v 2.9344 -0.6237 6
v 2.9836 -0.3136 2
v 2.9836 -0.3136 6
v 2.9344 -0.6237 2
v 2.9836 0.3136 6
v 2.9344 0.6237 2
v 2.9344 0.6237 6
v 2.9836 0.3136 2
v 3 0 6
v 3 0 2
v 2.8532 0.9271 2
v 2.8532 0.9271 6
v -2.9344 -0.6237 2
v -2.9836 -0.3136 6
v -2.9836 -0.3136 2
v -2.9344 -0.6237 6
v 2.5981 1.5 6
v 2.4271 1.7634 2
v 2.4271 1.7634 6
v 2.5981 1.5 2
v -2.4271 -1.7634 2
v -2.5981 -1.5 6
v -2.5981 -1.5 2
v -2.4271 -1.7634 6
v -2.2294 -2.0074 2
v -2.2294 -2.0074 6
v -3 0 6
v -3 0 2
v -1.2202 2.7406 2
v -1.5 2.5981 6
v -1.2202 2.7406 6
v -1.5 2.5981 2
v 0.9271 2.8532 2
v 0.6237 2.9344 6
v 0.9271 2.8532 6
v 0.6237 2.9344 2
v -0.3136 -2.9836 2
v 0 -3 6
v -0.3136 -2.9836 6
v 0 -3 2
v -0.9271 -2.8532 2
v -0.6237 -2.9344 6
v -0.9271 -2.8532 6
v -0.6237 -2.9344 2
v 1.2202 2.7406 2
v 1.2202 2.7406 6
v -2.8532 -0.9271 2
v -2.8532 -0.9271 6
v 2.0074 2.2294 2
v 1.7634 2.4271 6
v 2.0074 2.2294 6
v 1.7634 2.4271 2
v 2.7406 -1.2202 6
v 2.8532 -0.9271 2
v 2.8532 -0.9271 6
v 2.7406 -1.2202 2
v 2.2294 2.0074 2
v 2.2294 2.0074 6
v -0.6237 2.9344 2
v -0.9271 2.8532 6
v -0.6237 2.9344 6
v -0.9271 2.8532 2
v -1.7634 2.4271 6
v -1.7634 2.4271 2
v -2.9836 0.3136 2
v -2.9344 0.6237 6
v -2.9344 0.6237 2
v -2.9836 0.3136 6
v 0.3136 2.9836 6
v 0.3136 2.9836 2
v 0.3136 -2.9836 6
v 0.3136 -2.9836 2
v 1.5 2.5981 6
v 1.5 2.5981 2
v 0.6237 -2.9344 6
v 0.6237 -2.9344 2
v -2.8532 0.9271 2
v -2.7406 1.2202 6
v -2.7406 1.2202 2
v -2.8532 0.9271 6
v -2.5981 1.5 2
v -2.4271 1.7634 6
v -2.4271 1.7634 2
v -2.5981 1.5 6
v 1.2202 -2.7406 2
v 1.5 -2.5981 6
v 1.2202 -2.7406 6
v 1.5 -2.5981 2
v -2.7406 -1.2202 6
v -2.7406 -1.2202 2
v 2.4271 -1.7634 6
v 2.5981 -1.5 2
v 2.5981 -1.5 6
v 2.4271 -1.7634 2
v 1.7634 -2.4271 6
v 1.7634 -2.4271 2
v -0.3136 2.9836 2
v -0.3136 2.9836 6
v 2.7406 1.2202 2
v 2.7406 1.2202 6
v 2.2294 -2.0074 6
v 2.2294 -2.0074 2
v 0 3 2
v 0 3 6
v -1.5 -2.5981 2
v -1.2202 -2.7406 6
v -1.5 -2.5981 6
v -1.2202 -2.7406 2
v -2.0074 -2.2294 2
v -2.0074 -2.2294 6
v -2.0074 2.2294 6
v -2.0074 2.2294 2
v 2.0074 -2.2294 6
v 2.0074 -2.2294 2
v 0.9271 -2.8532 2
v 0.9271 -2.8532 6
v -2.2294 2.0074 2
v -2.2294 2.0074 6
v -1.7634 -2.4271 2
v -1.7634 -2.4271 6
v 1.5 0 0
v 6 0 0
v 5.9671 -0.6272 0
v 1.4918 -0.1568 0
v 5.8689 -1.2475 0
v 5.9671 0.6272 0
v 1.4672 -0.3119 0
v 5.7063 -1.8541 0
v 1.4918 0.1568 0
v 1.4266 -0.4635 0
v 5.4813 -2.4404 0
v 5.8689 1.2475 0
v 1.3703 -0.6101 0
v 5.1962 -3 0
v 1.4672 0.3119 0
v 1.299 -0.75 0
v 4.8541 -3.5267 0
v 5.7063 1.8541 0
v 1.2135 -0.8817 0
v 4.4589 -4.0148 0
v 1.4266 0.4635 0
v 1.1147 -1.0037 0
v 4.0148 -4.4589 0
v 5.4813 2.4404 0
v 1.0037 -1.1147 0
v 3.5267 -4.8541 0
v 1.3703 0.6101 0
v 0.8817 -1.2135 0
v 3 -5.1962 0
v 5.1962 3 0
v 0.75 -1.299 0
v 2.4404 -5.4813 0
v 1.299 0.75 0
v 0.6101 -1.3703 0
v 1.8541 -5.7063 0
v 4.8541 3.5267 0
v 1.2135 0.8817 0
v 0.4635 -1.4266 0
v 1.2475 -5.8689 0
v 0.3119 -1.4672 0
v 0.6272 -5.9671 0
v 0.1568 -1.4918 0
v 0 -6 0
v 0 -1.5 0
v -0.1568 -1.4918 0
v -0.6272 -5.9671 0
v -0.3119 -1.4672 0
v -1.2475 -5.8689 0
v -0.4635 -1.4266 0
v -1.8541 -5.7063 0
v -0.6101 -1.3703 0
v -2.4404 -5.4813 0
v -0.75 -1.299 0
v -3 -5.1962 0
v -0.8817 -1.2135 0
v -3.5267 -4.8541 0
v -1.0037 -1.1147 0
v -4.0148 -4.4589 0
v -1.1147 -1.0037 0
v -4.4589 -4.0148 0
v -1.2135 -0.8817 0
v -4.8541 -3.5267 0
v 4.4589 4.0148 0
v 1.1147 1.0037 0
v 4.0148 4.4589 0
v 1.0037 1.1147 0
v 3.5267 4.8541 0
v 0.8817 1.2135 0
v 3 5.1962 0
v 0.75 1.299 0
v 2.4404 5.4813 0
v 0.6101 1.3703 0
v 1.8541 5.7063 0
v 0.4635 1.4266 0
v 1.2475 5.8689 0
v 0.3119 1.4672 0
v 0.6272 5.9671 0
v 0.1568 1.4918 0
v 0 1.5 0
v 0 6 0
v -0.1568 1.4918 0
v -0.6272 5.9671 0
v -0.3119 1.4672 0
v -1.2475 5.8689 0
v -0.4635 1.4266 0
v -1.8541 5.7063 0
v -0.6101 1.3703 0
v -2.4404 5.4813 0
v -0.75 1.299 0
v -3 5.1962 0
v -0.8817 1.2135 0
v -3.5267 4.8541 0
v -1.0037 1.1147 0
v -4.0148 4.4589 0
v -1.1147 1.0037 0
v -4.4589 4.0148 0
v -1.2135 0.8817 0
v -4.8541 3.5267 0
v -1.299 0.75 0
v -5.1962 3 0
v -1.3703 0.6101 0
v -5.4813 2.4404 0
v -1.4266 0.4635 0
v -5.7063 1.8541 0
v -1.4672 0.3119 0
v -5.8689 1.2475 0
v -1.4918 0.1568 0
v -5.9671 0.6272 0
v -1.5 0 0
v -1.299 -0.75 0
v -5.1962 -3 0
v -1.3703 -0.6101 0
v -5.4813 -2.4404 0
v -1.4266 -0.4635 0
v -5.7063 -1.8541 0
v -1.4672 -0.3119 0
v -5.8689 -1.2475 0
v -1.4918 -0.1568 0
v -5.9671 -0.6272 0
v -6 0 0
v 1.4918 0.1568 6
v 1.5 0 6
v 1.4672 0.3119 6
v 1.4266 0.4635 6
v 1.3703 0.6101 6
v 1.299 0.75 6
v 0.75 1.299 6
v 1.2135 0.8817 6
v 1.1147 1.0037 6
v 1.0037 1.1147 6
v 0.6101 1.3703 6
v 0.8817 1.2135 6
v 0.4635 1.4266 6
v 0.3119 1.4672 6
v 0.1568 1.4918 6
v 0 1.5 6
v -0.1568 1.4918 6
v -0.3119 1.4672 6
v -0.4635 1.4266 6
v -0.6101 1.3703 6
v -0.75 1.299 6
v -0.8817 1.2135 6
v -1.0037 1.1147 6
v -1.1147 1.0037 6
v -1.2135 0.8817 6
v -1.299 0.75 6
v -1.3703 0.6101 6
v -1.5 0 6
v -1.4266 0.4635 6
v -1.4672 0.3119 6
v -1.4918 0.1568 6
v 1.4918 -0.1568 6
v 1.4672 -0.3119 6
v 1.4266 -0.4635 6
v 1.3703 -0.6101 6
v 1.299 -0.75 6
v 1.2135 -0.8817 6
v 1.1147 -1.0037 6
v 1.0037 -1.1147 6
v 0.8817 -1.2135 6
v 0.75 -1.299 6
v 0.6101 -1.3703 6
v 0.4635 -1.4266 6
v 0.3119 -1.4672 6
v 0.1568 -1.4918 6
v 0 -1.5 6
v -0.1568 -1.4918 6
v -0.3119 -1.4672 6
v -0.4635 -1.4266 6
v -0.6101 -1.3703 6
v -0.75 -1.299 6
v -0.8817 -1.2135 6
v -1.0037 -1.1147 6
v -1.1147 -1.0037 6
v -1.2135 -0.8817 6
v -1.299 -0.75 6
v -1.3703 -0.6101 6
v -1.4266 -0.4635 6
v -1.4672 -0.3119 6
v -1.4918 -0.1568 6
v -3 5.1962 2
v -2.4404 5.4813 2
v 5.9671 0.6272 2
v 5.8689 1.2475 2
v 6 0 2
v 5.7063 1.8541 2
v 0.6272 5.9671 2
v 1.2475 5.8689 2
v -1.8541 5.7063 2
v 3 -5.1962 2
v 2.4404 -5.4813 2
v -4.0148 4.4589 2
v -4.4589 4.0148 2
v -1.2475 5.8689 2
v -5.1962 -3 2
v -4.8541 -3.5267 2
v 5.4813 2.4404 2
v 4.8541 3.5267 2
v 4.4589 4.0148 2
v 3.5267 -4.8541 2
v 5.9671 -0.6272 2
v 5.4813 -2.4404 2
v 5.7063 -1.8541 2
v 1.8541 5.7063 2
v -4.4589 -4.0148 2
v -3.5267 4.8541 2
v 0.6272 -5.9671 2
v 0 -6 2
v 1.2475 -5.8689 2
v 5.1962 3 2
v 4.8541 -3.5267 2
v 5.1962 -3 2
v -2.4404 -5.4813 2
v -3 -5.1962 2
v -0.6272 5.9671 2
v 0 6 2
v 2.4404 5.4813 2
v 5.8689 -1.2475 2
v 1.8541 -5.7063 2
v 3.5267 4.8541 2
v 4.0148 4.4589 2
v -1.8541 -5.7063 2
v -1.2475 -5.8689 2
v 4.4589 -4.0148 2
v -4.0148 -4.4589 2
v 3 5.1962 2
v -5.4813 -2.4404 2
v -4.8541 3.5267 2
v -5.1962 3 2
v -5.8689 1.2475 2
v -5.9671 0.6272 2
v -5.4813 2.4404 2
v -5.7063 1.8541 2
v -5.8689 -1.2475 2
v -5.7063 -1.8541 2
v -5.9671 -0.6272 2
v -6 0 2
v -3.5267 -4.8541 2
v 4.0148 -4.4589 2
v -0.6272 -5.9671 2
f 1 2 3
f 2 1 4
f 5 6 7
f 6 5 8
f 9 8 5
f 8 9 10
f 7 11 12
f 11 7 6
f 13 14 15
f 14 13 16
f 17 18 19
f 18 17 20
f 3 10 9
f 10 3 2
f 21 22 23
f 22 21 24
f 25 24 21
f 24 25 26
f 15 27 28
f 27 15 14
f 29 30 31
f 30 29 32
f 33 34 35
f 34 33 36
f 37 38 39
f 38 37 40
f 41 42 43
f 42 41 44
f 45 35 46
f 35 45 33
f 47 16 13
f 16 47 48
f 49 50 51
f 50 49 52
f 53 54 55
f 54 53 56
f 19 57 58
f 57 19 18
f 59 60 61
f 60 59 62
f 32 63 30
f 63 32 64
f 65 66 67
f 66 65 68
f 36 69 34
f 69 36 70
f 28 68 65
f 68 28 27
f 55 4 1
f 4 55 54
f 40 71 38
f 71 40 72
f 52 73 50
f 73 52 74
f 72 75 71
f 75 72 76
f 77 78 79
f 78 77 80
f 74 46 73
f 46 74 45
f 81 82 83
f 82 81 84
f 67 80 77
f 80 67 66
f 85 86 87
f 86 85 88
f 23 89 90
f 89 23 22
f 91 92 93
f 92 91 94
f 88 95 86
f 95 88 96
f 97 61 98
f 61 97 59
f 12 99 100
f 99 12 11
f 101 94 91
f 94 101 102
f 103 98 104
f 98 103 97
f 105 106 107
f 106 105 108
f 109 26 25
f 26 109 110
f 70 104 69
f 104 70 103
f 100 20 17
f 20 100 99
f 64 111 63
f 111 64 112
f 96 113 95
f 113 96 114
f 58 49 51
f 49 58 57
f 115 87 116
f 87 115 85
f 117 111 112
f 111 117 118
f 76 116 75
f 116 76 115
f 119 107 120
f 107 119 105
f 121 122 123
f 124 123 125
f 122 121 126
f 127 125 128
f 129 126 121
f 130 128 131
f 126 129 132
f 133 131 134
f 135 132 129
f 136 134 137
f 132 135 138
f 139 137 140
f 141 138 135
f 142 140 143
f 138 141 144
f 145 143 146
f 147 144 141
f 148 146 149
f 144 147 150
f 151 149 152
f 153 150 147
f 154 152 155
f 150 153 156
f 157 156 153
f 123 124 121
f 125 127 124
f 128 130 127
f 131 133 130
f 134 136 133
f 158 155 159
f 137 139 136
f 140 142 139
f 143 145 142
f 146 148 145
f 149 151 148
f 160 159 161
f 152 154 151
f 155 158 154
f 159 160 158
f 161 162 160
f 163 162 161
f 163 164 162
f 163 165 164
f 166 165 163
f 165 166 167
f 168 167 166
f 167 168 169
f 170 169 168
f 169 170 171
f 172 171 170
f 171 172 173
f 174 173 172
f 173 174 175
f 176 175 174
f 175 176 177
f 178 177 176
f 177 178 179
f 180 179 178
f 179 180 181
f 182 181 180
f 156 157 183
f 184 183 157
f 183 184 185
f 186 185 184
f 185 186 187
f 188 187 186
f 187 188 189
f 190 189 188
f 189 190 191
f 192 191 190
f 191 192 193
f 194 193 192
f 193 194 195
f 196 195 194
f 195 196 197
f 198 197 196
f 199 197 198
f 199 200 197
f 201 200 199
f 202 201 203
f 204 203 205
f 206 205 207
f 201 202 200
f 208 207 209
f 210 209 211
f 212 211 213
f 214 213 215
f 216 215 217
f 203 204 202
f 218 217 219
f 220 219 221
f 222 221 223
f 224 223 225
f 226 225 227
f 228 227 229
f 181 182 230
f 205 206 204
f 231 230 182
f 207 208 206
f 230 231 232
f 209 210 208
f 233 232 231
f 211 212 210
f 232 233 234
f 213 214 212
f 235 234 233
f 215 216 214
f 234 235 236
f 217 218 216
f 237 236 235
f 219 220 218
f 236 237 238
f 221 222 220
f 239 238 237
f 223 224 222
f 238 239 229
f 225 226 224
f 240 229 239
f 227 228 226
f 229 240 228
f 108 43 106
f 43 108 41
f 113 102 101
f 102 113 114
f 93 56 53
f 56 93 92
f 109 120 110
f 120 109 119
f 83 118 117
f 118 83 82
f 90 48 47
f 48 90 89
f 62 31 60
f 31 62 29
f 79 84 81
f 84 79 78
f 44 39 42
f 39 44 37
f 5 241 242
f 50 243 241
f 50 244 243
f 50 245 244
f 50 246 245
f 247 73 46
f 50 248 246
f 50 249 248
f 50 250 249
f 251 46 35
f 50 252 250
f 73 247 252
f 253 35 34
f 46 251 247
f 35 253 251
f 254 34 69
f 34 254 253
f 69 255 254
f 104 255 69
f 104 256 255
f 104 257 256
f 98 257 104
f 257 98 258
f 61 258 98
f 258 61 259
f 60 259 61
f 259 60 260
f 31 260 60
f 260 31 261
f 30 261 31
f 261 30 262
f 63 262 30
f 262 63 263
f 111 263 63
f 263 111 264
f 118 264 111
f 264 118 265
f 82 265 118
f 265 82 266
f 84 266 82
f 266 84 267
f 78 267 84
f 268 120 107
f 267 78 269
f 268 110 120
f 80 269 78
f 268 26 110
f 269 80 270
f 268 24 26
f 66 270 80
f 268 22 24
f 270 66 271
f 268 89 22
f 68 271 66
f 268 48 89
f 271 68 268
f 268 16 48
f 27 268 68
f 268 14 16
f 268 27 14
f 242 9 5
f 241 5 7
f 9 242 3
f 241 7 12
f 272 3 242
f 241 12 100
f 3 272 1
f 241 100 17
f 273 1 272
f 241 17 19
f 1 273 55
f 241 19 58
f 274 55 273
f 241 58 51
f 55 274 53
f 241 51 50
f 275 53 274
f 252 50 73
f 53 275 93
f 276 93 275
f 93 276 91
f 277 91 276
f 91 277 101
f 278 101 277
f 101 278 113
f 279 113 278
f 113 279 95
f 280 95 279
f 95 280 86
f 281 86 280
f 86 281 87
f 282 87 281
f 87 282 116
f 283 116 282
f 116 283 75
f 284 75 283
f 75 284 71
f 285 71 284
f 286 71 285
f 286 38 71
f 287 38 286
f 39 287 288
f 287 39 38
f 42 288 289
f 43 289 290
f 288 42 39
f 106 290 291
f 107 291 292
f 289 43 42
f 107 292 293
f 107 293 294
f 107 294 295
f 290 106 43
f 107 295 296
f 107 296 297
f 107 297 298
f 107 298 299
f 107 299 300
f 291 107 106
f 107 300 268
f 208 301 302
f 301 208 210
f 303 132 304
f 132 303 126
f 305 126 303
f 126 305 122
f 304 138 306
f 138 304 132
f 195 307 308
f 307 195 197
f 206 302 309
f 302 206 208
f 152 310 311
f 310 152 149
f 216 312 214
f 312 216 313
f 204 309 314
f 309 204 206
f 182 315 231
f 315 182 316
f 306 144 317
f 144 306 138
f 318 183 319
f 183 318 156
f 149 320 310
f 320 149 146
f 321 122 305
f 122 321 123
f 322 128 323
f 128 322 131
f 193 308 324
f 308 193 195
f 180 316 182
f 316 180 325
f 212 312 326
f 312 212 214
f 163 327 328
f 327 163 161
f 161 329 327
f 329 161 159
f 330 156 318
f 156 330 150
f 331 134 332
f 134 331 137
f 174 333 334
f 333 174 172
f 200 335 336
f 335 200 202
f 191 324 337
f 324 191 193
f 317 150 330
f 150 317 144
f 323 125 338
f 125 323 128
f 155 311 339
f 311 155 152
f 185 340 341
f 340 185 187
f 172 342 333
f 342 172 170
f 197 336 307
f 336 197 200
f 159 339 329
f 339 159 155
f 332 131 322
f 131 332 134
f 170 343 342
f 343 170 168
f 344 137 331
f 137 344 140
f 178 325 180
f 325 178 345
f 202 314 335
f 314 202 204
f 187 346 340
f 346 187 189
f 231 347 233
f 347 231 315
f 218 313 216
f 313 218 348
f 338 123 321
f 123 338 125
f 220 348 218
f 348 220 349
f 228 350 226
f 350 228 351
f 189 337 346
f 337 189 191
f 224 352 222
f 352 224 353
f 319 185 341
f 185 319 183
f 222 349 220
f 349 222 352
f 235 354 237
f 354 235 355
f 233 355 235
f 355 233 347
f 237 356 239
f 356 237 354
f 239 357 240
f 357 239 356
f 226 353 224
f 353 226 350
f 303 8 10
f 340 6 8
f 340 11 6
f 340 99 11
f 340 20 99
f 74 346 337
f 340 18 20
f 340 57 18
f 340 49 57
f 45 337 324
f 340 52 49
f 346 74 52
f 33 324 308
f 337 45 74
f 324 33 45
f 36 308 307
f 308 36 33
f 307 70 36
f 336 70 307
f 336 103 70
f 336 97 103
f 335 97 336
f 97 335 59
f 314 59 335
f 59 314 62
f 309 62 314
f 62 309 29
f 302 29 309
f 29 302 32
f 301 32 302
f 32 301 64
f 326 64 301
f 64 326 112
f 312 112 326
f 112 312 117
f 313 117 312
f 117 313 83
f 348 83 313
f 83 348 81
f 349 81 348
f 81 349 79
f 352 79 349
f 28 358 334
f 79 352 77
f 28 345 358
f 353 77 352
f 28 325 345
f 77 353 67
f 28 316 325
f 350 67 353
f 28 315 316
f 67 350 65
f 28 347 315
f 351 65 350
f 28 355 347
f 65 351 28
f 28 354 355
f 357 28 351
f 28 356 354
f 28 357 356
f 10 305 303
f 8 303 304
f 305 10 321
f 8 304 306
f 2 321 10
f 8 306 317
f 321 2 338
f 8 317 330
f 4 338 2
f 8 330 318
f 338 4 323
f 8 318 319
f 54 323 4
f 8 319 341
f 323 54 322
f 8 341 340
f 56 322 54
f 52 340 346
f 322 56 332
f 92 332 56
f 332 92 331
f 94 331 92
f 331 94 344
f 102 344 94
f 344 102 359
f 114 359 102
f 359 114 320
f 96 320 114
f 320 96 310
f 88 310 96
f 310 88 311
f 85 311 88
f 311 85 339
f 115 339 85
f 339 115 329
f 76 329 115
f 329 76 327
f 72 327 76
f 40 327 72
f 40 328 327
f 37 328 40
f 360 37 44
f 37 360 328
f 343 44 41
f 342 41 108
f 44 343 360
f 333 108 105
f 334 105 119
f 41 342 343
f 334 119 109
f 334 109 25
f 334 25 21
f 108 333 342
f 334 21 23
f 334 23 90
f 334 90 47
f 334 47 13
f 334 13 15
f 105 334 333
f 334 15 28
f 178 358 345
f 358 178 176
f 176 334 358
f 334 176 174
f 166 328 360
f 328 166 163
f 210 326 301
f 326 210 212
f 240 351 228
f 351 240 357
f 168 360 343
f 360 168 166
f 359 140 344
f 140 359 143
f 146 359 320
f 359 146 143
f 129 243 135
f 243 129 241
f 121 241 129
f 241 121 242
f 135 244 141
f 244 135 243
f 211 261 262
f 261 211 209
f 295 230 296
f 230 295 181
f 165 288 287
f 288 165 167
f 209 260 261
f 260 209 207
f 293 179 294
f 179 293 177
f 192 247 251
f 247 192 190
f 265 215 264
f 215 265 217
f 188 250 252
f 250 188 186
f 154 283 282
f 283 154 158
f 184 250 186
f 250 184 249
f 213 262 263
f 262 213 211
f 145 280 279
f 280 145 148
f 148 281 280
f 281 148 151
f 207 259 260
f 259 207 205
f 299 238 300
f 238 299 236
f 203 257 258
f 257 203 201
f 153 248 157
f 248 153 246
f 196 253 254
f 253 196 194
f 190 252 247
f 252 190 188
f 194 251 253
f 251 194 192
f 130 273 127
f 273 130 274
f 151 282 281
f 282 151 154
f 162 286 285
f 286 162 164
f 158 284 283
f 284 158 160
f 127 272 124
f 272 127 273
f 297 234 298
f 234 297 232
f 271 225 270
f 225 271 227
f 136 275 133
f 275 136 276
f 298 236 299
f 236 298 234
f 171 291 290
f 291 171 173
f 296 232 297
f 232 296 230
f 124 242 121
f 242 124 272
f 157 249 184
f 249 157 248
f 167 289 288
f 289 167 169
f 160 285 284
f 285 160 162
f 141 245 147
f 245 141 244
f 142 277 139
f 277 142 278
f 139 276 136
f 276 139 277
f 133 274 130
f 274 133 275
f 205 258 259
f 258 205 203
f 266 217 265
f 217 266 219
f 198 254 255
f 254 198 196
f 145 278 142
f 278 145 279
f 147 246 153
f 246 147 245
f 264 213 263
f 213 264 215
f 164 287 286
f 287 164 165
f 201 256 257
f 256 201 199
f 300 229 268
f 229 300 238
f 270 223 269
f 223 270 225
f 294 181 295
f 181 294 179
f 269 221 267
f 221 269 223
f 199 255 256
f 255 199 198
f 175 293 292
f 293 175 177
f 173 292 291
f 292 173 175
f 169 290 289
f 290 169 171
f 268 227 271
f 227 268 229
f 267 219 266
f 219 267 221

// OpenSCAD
// Flanged spacer.
$fn = 60;
eps = 0.02;
inner_d = 3;
outer_d = 6;
length = 6;
flange_d = 12;
difference() { union() { cylinder(d=outer_d,h=length); cylinder(d=flange_d,h=2); } translate([0,0,-eps]) cylinder(d=inner_d,h=length+2*eps); }
